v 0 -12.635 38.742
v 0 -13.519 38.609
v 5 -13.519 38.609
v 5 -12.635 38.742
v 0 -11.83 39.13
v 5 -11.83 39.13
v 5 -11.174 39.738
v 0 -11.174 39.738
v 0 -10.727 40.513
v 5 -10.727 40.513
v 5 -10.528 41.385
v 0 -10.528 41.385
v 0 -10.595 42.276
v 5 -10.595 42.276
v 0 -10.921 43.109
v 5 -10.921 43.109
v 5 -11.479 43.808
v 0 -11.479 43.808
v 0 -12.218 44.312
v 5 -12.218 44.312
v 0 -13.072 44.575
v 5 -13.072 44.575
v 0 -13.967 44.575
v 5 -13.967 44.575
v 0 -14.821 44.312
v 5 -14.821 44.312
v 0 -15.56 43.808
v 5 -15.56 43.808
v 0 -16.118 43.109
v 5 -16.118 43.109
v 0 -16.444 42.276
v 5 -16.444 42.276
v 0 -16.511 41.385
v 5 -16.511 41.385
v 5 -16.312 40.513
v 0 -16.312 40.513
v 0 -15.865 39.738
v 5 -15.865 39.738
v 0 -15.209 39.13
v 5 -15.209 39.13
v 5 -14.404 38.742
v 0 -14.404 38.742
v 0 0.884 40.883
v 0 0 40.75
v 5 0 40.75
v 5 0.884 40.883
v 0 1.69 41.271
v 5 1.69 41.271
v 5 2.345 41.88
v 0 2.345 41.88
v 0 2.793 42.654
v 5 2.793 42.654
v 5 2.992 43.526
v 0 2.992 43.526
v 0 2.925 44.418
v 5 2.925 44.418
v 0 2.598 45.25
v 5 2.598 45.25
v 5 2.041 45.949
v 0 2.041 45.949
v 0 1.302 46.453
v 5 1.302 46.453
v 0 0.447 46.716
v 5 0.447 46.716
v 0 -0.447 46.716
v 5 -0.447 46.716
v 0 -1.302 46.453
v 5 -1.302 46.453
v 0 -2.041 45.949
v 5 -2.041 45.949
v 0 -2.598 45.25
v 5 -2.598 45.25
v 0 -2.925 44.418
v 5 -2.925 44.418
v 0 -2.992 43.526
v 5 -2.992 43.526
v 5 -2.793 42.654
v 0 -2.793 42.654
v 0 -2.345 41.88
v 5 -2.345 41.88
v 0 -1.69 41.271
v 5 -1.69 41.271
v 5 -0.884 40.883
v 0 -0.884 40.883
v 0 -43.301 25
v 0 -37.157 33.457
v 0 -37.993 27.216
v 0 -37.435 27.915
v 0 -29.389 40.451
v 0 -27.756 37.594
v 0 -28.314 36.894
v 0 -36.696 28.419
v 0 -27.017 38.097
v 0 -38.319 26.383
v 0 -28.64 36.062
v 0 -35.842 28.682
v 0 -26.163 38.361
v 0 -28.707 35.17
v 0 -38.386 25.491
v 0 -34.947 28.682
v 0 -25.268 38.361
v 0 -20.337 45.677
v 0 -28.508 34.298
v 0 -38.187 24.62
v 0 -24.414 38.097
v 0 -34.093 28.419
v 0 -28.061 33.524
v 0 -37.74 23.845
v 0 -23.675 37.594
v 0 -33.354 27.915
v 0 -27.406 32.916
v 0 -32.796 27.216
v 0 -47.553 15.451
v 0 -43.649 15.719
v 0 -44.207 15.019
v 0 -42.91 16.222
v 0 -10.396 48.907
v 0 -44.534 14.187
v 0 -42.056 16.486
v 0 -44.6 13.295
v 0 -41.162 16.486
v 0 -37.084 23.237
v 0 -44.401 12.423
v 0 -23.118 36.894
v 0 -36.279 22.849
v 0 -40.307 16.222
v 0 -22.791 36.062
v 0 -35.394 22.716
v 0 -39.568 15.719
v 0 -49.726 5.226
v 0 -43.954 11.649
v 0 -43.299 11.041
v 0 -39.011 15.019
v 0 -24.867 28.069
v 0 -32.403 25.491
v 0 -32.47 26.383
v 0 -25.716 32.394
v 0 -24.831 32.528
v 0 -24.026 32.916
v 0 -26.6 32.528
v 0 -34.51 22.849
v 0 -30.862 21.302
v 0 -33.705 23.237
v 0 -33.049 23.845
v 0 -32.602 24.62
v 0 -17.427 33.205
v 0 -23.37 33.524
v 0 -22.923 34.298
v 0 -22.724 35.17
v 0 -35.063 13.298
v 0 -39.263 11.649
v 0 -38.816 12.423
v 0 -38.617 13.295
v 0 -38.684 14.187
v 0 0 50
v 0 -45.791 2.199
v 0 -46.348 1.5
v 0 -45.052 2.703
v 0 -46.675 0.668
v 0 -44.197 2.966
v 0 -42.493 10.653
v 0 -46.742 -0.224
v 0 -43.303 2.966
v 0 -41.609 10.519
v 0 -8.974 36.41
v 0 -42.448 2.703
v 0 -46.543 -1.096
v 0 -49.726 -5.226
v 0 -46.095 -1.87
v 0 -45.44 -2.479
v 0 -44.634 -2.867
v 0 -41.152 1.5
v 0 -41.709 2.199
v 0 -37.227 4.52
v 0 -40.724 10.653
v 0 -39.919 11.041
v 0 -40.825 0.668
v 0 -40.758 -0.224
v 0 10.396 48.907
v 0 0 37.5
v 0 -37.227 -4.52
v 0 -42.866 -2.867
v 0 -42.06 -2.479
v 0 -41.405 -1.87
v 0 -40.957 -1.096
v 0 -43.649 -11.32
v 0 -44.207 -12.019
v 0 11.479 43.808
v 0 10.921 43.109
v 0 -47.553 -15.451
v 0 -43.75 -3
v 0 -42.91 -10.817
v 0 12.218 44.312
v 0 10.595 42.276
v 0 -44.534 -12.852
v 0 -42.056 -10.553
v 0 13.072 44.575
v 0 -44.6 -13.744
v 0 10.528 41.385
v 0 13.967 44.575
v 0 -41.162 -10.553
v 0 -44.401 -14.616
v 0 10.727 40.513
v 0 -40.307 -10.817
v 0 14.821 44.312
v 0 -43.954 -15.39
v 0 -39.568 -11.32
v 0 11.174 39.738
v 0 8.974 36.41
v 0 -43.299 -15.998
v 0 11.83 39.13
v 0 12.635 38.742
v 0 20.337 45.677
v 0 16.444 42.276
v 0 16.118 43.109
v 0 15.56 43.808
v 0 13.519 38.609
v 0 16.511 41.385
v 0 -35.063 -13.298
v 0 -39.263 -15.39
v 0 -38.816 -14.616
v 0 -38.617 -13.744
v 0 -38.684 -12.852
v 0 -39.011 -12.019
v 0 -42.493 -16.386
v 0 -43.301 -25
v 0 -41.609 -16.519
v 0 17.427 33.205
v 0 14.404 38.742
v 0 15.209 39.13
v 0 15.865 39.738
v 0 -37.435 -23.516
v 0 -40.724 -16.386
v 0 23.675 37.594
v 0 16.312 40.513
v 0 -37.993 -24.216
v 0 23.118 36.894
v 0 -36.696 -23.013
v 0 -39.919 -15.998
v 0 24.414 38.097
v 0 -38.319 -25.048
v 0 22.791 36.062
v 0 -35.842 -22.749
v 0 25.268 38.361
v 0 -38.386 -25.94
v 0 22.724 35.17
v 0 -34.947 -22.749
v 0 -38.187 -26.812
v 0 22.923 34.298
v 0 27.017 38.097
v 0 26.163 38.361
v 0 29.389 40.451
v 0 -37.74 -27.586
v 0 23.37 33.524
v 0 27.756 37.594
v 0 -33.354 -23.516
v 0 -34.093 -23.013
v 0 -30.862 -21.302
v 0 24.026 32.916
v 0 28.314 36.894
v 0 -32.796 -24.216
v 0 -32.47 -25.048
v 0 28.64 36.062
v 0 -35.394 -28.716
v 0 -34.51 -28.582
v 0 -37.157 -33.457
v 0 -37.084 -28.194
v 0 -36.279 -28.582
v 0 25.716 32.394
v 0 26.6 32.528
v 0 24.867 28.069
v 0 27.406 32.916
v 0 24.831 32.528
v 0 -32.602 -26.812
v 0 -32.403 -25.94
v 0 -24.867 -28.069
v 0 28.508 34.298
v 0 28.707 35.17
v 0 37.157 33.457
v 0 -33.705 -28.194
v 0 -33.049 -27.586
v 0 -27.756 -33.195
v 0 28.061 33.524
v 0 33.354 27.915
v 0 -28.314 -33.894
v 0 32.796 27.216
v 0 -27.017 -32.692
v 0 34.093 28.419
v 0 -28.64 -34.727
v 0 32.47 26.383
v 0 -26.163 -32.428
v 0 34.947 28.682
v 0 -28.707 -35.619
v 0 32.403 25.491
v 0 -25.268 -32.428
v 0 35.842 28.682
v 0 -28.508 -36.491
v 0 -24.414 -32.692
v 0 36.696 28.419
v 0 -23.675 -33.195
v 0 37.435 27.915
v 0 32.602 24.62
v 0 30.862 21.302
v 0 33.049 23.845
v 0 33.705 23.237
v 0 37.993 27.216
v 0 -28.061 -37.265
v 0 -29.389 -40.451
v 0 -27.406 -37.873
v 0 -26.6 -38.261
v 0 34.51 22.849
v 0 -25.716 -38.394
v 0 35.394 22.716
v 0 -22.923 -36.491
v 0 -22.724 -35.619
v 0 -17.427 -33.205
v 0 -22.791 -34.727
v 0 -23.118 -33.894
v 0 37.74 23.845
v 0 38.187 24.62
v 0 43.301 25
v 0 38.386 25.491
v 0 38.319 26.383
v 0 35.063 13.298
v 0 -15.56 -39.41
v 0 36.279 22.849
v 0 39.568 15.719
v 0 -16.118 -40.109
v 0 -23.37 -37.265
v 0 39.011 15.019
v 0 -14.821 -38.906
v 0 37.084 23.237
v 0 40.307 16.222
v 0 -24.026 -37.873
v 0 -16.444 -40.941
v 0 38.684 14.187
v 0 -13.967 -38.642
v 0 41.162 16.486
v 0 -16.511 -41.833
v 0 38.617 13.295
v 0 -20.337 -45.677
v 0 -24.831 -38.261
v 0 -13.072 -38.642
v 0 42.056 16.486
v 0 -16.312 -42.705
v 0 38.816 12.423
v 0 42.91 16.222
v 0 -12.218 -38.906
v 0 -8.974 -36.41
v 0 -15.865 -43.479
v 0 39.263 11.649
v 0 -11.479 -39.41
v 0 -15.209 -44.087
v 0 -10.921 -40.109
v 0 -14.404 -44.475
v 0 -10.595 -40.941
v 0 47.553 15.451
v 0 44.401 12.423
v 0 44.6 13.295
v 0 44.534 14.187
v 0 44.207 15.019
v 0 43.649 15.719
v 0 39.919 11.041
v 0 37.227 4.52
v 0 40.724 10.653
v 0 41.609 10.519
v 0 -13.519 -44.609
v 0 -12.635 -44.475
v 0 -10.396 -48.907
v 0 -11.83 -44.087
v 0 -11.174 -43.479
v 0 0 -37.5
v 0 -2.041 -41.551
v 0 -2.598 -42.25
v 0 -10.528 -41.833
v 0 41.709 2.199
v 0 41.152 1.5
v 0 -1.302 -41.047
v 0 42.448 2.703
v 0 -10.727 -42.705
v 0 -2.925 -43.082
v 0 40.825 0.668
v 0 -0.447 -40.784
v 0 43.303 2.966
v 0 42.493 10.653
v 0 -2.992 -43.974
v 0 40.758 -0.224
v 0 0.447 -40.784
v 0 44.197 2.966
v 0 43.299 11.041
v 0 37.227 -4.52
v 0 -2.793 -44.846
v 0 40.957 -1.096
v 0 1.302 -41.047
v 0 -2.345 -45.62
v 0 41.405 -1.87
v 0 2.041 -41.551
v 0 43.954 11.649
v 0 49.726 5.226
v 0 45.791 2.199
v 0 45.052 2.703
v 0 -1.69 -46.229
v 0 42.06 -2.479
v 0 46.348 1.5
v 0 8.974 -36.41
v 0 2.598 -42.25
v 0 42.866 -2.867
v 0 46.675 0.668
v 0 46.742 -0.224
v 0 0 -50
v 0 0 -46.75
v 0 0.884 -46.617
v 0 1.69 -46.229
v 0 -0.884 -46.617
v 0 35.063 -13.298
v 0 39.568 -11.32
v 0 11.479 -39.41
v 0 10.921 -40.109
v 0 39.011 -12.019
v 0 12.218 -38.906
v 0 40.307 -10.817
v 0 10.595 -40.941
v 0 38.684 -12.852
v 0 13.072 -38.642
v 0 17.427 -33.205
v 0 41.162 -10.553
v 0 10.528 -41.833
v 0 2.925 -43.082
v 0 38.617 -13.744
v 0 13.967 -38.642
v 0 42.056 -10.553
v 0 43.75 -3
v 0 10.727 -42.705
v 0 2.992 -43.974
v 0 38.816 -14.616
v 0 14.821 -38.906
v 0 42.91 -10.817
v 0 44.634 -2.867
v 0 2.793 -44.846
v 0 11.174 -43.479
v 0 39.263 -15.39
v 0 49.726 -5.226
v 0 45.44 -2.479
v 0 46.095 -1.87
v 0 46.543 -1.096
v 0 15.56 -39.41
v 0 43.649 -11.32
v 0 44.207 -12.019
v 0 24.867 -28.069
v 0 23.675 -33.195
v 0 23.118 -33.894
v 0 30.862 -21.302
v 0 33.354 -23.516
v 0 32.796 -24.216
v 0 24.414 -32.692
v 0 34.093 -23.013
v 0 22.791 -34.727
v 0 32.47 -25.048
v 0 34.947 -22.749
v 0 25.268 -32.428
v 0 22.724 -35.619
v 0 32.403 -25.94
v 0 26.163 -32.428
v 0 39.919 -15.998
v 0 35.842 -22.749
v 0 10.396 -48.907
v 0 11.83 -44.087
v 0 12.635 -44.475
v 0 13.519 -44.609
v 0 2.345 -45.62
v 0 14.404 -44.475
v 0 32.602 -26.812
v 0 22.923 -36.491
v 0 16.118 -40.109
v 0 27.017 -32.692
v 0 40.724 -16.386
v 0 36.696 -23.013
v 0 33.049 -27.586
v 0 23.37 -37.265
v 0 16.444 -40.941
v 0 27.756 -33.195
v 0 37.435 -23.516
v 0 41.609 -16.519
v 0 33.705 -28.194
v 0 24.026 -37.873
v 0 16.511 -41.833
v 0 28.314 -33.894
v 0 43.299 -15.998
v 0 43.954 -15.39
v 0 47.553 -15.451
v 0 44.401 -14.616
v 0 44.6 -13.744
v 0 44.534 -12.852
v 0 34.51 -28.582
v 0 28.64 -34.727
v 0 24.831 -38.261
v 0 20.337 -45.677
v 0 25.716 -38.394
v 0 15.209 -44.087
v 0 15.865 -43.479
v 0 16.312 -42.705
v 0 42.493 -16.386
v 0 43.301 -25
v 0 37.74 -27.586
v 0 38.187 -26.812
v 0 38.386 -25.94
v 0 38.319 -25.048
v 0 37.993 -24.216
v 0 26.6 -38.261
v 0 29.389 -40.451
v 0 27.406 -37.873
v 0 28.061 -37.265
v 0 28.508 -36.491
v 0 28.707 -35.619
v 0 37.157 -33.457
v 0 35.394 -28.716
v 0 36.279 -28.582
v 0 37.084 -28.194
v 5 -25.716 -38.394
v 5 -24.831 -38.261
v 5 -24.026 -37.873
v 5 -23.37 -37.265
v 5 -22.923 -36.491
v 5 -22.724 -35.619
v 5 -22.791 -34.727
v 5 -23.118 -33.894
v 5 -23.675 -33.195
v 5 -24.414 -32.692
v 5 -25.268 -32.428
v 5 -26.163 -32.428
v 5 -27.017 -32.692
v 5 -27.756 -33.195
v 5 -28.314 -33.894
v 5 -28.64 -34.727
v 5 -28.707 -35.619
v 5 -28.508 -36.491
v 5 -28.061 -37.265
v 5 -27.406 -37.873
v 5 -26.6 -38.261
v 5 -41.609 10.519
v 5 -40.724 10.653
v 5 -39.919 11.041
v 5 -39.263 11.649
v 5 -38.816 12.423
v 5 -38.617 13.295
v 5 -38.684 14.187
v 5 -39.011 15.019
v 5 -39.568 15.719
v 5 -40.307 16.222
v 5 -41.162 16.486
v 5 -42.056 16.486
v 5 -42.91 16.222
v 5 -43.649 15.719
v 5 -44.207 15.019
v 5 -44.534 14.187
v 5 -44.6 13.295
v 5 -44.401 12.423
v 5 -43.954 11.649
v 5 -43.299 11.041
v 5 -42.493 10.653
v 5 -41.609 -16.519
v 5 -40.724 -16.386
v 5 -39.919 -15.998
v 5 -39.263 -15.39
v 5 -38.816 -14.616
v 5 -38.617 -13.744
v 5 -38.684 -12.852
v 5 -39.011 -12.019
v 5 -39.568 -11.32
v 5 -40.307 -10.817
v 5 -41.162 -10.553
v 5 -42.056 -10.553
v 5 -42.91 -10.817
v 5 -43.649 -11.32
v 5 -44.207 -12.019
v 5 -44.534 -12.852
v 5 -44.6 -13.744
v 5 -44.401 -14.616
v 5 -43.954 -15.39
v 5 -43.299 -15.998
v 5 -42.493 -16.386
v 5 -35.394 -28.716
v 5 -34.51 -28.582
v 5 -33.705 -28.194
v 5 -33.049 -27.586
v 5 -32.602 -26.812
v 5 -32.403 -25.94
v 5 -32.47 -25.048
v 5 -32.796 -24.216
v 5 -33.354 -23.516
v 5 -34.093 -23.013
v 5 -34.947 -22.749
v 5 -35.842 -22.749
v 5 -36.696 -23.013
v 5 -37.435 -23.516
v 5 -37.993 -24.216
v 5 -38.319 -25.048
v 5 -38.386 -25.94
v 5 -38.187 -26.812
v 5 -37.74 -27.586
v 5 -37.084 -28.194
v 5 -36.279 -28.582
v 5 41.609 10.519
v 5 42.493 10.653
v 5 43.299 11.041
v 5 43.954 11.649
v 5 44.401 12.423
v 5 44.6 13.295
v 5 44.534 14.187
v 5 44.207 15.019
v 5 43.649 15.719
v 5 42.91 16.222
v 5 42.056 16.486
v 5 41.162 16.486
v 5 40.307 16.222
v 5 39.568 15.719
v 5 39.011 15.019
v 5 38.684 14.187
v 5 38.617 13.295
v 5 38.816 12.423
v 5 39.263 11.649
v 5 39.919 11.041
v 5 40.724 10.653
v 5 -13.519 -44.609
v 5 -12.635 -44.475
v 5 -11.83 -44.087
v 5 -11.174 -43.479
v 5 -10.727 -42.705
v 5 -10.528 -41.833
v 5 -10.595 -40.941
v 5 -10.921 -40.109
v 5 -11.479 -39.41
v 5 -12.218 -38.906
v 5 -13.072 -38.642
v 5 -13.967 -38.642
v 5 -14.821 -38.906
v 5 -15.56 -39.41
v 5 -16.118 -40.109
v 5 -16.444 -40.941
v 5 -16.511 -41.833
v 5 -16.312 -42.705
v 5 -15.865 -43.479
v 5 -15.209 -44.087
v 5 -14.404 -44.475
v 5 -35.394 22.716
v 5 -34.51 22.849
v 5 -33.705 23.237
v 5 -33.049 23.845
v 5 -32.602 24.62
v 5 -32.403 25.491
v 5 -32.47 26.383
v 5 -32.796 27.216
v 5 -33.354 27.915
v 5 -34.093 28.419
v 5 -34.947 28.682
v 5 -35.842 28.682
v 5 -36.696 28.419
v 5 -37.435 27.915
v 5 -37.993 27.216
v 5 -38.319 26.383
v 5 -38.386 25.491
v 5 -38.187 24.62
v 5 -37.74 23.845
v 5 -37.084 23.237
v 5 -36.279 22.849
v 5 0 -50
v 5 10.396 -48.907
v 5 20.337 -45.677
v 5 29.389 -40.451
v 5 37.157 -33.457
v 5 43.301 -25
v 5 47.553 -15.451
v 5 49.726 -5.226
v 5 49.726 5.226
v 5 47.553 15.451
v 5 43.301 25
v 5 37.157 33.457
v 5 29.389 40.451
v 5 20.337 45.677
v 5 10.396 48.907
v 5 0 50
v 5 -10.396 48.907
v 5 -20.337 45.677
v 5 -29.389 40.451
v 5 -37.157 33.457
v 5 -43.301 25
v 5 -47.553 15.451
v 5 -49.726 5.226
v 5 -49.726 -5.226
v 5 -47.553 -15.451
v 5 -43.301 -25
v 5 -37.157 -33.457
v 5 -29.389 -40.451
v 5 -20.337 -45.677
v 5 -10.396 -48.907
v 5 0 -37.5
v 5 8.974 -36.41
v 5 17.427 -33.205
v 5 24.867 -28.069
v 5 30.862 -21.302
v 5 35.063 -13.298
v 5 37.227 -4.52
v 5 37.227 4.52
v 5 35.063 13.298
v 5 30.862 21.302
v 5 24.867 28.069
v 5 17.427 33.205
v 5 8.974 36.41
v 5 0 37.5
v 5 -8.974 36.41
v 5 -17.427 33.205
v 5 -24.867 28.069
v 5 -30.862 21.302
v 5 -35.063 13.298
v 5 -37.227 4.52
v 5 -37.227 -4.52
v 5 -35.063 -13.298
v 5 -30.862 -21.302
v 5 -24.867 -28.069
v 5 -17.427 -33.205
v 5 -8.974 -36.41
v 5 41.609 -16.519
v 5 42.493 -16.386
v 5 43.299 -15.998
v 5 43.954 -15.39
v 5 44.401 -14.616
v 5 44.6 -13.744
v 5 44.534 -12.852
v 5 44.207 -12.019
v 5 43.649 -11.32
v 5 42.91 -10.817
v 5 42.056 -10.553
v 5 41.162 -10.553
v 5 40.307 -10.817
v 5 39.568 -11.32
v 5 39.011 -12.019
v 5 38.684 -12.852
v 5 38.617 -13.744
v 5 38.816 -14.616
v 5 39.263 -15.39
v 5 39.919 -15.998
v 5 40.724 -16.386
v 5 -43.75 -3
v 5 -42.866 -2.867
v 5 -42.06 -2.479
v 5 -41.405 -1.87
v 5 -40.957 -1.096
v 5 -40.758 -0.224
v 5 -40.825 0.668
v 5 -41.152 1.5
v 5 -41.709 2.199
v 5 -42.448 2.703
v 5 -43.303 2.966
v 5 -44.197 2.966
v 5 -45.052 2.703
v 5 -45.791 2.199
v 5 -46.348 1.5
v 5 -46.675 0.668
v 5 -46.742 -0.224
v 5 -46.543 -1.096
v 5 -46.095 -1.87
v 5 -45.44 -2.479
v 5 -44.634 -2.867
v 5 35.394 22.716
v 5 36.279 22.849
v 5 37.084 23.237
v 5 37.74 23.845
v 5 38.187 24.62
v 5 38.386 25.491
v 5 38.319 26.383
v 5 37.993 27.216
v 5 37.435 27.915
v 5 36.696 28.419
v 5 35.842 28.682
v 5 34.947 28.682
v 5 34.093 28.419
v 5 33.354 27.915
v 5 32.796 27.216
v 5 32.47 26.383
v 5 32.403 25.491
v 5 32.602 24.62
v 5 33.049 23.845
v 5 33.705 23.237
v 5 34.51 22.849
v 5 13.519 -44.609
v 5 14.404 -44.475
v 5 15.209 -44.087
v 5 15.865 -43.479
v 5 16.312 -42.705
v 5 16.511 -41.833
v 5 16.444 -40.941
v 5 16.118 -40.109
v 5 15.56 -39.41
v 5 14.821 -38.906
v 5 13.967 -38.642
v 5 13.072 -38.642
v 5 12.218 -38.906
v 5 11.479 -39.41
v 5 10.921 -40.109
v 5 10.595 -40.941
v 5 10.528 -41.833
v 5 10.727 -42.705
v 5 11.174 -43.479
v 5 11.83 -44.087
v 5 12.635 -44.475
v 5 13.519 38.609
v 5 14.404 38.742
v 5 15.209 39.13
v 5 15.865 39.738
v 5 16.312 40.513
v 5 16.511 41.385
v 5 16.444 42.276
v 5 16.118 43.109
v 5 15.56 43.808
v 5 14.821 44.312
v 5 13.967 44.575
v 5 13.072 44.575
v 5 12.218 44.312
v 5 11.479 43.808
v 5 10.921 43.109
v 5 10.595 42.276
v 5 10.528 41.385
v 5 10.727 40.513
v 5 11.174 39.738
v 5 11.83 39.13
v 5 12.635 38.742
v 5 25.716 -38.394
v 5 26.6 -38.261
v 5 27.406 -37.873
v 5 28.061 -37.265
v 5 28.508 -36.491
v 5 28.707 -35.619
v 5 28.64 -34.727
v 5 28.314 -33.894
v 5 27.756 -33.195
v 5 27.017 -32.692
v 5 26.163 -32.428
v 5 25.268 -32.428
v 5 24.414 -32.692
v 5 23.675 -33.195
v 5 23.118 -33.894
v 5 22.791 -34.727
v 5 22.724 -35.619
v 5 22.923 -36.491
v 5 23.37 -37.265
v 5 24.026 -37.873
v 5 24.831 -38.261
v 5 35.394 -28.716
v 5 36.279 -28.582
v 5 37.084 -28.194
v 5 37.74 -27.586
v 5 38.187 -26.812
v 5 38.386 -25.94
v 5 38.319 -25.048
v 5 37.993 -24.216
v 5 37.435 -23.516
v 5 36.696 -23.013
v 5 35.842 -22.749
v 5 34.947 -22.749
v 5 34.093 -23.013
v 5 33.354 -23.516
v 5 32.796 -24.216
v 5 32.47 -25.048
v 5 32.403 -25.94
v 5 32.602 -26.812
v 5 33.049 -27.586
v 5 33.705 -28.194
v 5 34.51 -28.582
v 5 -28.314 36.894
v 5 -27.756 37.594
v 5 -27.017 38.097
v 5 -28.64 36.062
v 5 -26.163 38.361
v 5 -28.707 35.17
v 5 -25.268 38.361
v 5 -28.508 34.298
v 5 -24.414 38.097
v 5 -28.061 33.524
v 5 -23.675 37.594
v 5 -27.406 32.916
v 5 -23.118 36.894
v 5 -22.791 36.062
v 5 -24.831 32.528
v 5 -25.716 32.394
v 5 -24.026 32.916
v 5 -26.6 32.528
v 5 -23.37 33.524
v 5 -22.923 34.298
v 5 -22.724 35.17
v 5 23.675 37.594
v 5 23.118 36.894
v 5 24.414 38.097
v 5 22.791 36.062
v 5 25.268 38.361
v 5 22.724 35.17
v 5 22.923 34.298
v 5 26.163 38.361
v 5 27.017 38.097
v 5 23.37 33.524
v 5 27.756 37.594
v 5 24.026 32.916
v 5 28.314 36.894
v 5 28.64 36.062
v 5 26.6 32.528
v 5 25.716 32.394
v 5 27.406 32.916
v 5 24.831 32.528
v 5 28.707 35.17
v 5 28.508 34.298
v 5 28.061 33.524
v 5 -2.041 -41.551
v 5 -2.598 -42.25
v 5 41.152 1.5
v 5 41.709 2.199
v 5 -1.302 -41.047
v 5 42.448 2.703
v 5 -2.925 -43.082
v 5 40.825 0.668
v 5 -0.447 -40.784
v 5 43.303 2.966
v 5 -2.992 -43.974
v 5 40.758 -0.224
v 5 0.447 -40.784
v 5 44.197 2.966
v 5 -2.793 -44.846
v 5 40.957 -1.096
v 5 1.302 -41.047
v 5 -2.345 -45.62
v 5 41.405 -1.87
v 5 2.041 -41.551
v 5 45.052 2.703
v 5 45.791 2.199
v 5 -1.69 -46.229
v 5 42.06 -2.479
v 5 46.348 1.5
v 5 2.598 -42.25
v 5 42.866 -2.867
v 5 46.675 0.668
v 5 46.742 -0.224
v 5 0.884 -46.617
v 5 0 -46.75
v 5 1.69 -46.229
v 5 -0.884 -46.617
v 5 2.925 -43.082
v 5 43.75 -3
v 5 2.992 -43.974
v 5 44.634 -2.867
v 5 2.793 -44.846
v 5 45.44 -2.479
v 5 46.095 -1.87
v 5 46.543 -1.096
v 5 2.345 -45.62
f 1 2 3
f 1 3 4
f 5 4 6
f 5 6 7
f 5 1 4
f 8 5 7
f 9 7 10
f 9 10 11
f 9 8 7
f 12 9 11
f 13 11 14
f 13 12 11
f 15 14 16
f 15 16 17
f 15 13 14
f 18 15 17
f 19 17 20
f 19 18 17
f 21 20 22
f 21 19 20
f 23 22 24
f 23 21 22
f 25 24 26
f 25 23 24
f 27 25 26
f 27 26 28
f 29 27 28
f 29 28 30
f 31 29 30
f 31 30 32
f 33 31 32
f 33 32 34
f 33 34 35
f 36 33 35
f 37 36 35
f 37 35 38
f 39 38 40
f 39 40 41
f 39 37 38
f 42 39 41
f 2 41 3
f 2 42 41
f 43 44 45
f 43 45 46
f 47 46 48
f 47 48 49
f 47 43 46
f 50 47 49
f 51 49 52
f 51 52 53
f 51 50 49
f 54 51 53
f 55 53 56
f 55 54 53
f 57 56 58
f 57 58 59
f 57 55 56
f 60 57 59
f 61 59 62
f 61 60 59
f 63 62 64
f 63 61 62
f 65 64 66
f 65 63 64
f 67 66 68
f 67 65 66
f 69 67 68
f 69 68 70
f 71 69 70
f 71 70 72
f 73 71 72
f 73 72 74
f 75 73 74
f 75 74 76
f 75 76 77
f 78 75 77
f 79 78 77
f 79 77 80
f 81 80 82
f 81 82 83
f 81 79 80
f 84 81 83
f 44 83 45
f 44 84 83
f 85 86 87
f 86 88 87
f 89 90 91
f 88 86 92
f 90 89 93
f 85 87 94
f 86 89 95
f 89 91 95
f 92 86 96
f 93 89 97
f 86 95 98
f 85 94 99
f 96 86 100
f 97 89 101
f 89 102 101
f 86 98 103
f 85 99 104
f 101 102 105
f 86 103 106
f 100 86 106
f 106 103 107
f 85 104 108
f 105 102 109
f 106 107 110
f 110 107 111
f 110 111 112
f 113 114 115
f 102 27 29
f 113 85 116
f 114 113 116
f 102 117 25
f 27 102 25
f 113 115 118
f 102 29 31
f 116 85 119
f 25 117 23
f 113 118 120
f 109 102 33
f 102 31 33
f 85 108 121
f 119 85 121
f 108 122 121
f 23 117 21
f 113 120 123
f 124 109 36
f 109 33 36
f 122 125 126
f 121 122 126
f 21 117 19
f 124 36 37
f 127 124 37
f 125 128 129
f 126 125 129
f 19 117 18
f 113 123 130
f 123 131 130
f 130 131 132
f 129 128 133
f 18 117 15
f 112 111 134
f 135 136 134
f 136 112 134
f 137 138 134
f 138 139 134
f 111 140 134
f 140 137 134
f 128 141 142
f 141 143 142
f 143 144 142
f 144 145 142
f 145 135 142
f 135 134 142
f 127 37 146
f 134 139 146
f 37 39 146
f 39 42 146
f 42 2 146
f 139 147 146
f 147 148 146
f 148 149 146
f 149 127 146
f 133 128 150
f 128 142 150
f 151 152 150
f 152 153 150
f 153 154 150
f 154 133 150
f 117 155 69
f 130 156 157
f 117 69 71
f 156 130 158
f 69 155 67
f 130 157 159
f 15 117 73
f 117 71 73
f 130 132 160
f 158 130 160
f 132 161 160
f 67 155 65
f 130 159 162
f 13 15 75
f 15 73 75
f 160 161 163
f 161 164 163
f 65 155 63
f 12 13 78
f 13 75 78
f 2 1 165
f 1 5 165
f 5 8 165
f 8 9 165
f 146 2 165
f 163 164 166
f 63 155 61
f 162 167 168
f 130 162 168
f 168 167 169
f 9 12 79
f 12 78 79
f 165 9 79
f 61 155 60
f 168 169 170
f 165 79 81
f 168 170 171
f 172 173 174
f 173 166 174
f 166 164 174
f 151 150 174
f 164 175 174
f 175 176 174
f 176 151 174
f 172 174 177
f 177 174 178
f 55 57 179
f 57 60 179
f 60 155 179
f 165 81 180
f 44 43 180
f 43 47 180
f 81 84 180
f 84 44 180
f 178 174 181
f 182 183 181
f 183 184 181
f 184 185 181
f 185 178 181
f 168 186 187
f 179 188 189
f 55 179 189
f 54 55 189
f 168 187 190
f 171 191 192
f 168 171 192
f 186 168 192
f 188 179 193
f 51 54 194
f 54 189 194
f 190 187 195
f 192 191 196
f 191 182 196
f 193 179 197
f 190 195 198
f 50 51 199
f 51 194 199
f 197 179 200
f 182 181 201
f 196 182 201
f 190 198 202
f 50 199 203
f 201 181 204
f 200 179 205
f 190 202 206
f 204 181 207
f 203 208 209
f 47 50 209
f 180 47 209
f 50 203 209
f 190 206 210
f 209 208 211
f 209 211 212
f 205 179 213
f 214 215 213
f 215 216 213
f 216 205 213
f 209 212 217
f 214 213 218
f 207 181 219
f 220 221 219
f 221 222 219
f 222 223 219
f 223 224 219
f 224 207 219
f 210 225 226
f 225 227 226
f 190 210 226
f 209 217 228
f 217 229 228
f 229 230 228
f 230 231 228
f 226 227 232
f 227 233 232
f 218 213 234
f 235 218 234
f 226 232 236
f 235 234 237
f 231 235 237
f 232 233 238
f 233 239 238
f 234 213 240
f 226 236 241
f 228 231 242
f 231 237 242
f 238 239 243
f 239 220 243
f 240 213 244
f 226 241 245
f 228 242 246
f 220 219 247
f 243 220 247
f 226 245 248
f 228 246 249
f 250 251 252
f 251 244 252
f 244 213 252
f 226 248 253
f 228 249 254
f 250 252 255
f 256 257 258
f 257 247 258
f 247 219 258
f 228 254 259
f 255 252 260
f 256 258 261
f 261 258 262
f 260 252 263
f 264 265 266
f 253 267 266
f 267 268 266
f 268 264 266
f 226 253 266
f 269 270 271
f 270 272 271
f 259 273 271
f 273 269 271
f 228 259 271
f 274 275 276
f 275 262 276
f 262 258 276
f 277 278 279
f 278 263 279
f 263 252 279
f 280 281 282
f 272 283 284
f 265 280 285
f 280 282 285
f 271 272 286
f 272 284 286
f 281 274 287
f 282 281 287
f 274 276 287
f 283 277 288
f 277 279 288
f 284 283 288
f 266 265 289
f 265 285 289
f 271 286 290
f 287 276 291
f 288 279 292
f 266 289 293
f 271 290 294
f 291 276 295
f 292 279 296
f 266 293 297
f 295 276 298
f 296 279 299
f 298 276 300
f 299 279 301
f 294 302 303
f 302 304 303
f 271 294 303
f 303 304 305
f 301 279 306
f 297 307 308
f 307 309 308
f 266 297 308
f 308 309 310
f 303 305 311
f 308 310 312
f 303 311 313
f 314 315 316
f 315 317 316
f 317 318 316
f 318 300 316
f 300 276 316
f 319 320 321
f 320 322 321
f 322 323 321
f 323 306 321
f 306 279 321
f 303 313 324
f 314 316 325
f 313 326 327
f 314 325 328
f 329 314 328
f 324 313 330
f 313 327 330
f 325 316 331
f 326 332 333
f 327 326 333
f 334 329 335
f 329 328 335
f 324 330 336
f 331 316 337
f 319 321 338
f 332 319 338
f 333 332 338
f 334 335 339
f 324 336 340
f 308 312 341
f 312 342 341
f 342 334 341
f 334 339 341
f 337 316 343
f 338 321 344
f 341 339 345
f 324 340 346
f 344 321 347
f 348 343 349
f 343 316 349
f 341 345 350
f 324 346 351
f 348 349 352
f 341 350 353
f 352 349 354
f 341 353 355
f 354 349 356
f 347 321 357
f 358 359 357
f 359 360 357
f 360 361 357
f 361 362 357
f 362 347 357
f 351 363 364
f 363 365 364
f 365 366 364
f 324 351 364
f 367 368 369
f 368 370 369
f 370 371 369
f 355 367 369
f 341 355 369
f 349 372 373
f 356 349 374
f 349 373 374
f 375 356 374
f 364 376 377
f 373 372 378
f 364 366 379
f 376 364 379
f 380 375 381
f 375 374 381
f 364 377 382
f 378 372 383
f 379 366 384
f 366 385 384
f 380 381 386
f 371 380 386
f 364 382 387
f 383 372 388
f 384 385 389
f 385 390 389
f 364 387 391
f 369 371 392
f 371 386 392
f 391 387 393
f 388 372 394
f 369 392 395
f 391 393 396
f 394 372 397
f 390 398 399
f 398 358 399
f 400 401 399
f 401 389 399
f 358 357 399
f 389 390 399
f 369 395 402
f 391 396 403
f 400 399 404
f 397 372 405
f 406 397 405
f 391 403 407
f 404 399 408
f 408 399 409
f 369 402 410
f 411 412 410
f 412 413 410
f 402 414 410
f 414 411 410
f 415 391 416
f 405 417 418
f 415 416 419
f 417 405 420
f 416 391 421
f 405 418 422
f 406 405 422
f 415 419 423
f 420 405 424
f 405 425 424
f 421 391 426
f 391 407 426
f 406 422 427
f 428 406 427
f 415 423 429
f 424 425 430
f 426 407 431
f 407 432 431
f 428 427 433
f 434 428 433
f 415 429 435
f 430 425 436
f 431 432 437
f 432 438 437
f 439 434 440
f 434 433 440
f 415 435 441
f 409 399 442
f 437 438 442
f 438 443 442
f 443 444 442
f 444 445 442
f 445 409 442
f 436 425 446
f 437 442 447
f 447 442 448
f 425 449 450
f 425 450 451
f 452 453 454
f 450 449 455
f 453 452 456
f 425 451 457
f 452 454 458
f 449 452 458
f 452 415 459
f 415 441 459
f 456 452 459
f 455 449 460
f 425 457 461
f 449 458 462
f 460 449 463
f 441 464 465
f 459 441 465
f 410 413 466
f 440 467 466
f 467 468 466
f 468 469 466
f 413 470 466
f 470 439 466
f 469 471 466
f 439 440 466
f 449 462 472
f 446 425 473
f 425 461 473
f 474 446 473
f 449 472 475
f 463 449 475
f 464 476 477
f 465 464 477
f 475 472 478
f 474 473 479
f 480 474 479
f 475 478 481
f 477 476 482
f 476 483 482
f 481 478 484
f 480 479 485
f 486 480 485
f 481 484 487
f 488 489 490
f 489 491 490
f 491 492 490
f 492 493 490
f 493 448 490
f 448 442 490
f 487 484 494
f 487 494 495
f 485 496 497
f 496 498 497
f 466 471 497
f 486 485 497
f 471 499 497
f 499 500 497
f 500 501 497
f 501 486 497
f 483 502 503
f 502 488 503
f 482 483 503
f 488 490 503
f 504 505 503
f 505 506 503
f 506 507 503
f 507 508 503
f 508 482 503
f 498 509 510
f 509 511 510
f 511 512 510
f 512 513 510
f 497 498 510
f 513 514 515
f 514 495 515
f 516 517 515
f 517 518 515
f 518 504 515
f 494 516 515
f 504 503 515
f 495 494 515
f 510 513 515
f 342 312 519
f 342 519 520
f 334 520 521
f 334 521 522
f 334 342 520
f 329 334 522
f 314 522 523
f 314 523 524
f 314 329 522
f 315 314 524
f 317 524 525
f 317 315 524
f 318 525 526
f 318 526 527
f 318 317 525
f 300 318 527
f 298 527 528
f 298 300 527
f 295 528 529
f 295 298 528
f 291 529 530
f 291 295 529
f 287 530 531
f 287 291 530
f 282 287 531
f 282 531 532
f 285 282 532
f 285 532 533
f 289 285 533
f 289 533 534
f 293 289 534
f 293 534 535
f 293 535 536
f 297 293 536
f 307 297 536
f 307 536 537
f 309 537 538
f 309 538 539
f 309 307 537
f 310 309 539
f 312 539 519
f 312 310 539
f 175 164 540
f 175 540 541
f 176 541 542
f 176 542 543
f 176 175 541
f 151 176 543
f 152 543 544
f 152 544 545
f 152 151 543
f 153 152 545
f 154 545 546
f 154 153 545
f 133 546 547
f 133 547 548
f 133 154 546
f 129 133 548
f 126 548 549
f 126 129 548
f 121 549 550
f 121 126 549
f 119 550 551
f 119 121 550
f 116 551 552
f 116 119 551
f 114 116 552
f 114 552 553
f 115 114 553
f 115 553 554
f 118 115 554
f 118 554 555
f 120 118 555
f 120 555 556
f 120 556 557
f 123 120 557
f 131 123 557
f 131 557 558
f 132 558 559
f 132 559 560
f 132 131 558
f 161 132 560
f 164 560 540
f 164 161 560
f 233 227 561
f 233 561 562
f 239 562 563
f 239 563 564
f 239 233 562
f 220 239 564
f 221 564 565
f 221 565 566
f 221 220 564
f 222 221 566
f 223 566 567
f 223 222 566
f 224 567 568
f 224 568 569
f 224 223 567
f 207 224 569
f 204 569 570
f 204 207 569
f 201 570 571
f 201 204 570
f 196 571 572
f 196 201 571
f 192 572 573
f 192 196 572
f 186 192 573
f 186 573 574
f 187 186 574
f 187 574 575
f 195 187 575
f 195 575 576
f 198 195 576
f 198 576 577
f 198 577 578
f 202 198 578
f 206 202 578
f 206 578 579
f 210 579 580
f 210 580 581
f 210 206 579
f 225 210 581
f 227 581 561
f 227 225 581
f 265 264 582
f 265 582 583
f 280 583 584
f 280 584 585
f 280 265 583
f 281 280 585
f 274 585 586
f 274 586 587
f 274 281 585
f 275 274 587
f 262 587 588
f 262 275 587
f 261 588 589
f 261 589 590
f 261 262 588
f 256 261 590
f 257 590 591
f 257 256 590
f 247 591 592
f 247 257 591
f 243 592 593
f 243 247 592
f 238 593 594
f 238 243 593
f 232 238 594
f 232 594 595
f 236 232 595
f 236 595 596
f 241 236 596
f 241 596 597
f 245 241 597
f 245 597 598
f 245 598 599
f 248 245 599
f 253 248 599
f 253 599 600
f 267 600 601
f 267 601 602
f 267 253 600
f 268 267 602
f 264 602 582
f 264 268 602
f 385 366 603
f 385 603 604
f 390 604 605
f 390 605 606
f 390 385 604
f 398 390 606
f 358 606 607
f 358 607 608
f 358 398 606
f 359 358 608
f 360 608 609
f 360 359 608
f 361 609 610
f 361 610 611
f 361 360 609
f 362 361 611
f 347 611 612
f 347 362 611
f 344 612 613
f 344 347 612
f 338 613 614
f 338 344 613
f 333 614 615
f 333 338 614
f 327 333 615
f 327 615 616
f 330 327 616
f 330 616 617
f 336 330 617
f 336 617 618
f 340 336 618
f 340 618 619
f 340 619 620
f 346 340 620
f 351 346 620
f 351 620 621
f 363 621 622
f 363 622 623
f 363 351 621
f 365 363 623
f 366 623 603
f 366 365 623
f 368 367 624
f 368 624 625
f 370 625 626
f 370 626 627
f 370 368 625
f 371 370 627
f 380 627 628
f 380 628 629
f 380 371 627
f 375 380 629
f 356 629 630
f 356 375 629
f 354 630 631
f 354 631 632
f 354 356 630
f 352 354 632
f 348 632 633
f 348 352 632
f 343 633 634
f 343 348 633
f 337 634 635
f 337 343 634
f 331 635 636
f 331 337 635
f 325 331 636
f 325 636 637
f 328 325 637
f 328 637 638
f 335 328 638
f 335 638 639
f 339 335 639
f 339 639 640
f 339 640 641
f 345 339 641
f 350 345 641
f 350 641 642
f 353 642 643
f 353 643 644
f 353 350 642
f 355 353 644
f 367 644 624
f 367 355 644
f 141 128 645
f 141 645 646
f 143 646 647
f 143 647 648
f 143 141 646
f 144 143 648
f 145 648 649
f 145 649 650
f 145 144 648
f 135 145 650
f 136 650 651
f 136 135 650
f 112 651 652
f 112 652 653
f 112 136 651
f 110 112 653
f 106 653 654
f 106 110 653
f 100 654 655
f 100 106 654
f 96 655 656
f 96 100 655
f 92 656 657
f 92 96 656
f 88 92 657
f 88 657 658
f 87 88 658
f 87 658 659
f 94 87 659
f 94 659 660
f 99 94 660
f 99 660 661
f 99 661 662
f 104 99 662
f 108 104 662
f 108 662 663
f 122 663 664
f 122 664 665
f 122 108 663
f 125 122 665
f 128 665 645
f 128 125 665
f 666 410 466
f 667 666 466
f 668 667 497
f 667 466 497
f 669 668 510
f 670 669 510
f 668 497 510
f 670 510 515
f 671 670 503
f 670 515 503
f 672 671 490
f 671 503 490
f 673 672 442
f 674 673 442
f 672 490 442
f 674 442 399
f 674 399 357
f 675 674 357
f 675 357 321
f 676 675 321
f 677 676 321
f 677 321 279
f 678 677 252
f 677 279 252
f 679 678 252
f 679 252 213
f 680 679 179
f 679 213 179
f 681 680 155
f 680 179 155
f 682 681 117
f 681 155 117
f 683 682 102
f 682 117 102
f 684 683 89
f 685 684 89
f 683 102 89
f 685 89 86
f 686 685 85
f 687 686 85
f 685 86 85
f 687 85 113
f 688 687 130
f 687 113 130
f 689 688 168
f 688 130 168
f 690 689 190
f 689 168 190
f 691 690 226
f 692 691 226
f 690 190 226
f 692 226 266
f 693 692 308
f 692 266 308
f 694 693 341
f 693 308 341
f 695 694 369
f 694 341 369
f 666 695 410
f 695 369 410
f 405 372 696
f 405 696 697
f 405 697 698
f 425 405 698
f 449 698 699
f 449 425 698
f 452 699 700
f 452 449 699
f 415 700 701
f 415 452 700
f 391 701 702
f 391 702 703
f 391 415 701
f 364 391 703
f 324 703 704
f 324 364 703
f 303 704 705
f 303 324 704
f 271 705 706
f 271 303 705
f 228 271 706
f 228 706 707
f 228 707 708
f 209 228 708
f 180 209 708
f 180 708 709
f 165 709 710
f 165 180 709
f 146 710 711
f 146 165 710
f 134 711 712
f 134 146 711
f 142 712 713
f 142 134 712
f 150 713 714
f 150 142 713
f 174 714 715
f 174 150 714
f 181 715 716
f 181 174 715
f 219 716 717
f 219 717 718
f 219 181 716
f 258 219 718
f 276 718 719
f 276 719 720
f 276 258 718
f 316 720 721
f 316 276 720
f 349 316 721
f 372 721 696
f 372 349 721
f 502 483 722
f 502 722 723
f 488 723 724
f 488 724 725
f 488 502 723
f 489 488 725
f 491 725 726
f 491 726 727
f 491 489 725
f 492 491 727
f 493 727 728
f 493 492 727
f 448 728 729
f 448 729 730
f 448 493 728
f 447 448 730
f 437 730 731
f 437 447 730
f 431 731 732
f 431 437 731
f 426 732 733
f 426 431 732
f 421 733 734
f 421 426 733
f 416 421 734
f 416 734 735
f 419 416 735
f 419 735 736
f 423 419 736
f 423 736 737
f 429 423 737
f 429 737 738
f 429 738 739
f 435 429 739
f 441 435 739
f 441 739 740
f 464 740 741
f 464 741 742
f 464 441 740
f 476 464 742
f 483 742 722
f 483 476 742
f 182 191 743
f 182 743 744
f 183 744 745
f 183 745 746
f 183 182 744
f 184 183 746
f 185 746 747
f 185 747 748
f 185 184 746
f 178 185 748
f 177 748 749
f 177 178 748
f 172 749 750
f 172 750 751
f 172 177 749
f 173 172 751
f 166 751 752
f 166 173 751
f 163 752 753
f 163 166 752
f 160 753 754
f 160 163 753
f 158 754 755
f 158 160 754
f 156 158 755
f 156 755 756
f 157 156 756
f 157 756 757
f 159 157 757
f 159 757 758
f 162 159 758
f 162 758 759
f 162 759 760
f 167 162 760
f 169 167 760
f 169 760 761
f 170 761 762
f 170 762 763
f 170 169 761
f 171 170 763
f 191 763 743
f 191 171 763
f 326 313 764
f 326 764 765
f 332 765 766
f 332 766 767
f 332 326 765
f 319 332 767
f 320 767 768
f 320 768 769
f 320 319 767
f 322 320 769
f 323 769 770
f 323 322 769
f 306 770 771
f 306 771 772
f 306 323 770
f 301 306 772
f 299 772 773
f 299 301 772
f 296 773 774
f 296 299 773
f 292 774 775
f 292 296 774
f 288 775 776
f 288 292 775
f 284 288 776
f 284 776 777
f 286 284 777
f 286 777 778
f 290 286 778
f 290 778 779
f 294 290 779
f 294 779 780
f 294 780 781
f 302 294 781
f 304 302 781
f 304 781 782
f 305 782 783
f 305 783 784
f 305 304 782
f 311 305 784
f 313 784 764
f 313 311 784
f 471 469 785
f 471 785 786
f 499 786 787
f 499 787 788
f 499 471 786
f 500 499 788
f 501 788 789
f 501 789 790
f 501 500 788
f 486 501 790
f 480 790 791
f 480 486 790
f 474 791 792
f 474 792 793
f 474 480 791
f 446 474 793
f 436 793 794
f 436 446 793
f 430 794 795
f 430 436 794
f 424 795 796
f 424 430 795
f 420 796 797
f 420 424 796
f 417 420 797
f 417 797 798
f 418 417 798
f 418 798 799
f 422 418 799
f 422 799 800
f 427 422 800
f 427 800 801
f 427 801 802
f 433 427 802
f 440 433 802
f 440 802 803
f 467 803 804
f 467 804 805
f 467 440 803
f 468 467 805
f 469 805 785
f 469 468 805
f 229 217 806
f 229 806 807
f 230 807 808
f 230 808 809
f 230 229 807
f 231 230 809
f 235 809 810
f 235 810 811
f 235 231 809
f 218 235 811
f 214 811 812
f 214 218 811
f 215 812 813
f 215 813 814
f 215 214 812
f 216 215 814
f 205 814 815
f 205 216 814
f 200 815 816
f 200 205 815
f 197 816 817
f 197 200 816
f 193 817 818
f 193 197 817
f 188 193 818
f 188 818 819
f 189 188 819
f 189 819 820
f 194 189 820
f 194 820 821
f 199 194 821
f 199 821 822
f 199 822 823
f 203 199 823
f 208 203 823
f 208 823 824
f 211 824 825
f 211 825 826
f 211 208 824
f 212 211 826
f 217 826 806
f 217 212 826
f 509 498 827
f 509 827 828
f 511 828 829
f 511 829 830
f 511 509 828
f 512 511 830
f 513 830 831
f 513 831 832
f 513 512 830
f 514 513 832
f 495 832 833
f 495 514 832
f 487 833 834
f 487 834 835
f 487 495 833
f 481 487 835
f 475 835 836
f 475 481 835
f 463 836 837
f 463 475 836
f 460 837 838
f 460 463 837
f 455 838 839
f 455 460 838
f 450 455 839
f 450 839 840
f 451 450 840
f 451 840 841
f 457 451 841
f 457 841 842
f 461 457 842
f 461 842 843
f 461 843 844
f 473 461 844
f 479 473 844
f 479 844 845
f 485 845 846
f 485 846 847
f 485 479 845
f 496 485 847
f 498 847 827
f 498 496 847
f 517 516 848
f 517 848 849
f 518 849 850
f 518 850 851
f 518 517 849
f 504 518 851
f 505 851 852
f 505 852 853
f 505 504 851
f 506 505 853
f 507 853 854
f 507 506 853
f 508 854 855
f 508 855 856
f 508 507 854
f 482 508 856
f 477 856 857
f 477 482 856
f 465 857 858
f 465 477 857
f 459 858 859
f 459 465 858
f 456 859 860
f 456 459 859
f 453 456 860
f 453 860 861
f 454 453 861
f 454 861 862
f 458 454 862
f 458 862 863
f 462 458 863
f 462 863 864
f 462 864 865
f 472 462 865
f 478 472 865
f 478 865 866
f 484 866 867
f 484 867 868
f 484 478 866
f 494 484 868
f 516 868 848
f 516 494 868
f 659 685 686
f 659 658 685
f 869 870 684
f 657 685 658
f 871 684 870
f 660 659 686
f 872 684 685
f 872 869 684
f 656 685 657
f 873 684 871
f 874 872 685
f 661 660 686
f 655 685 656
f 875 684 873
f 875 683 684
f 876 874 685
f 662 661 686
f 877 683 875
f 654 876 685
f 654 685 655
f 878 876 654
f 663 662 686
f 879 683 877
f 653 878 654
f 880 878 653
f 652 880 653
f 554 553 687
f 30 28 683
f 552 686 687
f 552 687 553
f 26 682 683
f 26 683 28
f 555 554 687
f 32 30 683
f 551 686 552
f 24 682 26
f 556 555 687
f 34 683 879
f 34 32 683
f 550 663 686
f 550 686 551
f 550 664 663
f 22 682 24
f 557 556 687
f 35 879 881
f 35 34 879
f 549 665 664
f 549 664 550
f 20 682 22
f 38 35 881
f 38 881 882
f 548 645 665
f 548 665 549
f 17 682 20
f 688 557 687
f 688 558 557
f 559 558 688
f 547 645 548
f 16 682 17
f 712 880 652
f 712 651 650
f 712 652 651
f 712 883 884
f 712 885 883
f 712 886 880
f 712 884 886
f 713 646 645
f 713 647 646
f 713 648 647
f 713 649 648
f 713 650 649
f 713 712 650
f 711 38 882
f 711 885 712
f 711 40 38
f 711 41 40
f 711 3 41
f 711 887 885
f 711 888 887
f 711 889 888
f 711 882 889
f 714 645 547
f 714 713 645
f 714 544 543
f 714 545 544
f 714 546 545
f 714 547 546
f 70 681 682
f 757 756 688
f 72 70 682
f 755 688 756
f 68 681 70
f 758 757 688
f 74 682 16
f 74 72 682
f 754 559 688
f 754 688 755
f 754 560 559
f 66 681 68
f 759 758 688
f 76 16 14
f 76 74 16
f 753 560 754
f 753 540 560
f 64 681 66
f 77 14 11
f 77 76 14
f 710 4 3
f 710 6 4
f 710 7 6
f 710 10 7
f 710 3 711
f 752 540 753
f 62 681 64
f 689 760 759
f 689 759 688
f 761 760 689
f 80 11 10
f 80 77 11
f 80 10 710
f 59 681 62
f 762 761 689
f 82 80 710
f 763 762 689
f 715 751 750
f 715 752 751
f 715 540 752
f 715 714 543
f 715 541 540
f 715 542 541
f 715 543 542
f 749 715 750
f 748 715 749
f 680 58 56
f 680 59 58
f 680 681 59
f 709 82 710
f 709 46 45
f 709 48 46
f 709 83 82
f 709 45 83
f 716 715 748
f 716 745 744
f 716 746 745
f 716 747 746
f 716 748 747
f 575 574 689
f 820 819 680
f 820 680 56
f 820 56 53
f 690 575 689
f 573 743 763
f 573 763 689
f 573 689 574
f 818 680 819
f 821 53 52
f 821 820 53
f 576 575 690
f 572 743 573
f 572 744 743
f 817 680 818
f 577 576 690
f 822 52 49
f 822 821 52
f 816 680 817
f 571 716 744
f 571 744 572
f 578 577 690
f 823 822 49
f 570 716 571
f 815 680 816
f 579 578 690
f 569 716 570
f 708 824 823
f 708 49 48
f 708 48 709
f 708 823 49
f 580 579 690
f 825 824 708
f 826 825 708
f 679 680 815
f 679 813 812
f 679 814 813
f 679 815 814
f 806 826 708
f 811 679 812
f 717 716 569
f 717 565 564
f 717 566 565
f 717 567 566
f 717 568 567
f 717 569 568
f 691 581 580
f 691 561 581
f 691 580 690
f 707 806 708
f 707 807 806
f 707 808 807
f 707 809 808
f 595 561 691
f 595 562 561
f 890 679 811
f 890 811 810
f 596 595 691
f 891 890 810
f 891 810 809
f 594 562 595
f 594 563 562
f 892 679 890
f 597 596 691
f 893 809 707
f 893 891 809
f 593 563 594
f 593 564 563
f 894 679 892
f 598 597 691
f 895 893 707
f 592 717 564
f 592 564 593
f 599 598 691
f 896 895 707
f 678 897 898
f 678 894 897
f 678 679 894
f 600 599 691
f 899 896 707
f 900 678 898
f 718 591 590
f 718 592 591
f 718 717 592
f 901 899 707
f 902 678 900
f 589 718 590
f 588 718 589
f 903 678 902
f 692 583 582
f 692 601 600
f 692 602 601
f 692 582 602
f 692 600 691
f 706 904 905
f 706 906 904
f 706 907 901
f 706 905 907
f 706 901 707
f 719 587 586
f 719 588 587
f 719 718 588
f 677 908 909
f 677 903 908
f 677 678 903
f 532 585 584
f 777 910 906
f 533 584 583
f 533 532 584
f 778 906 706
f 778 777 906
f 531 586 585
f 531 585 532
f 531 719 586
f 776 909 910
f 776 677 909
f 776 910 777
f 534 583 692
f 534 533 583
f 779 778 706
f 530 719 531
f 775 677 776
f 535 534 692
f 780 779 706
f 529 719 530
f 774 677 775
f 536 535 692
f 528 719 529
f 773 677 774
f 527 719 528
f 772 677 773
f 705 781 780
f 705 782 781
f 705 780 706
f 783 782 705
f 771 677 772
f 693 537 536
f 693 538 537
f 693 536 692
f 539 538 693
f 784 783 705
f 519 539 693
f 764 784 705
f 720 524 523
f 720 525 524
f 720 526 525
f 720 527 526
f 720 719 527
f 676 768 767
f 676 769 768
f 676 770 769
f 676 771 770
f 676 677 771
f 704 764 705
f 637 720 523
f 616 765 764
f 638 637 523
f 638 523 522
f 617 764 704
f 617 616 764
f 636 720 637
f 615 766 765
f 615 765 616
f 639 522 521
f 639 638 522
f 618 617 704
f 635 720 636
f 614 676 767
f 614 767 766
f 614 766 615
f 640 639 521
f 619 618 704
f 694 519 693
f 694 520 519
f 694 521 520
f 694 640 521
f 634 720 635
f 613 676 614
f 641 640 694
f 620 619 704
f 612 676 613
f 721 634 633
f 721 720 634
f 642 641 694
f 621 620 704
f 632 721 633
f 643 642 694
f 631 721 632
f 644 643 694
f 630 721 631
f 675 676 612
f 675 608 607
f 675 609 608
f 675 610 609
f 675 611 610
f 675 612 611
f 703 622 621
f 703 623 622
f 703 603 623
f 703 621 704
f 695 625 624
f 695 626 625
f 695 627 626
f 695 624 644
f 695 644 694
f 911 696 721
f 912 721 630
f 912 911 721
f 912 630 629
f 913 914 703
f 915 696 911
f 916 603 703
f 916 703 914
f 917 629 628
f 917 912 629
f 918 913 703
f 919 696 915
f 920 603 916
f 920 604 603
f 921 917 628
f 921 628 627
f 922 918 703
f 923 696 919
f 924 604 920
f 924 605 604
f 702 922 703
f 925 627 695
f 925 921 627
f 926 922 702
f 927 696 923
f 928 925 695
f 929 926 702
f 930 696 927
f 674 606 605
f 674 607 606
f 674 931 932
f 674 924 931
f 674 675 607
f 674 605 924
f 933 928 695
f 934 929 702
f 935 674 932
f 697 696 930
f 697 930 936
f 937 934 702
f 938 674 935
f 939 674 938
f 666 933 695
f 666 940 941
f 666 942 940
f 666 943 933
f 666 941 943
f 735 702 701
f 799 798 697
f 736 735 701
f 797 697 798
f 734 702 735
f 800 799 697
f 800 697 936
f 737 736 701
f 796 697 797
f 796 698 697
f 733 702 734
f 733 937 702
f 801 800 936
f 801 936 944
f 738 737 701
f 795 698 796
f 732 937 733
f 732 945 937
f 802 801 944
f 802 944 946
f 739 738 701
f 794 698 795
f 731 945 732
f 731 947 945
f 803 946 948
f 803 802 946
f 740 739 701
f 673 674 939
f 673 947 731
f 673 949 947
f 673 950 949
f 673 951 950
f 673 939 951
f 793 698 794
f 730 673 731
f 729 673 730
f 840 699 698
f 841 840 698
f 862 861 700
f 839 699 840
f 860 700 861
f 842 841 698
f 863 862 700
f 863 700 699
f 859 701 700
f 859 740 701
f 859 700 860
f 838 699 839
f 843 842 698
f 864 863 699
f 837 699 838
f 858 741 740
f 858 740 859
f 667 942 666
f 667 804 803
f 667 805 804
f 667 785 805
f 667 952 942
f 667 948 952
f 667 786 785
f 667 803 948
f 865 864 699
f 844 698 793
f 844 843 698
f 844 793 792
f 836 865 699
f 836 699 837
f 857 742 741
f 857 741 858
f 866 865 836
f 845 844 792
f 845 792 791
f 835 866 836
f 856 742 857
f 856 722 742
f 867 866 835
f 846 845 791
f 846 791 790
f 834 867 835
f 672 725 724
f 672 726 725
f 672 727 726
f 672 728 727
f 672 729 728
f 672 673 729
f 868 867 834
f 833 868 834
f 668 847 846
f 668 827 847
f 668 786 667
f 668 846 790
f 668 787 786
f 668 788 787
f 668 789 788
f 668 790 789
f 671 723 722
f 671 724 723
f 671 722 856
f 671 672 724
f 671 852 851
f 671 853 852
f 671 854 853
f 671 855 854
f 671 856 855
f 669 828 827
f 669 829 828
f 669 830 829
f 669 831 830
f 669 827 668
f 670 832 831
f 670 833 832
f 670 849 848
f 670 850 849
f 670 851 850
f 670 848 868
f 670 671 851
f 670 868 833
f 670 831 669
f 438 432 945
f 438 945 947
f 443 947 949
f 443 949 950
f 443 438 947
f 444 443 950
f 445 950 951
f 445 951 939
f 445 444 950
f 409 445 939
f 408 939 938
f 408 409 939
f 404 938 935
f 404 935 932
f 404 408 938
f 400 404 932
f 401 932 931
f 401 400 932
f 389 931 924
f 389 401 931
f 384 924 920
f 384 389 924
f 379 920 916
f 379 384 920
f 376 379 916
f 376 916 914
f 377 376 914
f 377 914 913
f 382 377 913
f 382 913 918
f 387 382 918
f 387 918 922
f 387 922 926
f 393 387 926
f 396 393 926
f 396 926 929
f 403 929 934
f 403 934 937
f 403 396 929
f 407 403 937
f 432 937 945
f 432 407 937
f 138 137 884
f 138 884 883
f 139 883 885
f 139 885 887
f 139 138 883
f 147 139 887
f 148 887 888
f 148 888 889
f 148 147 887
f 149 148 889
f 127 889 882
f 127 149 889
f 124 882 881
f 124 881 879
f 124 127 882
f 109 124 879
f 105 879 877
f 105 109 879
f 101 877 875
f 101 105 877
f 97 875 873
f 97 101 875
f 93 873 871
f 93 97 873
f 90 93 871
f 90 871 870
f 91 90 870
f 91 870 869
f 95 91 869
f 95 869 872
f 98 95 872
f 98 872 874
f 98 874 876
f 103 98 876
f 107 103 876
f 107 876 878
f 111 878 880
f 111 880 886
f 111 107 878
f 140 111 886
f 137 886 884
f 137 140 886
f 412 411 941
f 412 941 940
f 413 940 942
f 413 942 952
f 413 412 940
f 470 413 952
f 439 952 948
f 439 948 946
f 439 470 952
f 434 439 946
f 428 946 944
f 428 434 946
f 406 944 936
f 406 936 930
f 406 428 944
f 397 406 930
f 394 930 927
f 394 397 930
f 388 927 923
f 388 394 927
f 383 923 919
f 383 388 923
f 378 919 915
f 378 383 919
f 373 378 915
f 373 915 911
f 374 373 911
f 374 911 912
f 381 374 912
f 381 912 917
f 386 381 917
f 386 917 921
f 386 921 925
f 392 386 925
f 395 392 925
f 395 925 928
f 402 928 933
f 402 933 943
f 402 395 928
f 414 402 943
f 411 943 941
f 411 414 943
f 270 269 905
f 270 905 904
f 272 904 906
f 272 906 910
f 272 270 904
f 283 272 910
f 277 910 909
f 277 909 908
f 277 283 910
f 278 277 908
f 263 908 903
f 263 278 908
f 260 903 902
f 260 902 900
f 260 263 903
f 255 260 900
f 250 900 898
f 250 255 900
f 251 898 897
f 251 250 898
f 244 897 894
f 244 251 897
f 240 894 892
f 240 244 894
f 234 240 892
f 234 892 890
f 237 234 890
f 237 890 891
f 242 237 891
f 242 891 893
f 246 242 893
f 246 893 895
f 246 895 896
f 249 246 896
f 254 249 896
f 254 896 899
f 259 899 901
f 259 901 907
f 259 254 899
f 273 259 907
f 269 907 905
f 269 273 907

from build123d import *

# Parameters (mm, degrees)
SKETCH_1_R      = 50
SKETCH_1_R_2    = 37.5
SKETCH_1_R_3    = 3
EXTRUDE_1_DEPTH = 5


with BuildPart() as part:
    # Эскиз1 → Бобышка-Вытянуть1 (new body)
    with BuildSketch(Plane(origin=(0, 0, 0), x_dir=(0, 0, -1), z_dir=(1, 0, 0))):
        Circle(SKETCH_1_R)
        Circle(SKETCH_1_R_2, mode=Mode.SUBTRACT)
        with Locations((0, 43.75)):
            Circle(SKETCH_1_R_3, mode=Mode.SUBTRACT)
        with Locations((13.519493504, 41.608722588)):
            Circle(SKETCH_1_R_3, mode=Mode.SUBTRACT)
        with Locations((25.715604788, 35.394493504)):
            Circle(SKETCH_1_R_3, mode=Mode.SUBTRACT)
        with Locations((35.394493504, 25.715604788)):
            Circle(SKETCH_1_R_3, mode=Mode.SUBTRACT)
        with Locations((41.608722588, 13.519493504)):
            Circle(SKETCH_1_R_3, mode=Mode.SUBTRACT)
        with Locations((43.75, 0)):
            Circle(SKETCH_1_R_3, mode=Mode.SUBTRACT)
        with Locations((41.608722588, -13.519493504)):
            Circle(SKETCH_1_R_3, mode=Mode.SUBTRACT)
        with Locations((35.394493504, -25.715604788)):
            Circle(SKETCH_1_R_3, mode=Mode.SUBTRACT)
        with Locations((25.715604788, -35.394493504)):
            Circle(SKETCH_1_R_3, mode=Mode.SUBTRACT)
        with Locations((13.519493504, -41.608722588)):
            Circle(SKETCH_1_R_3, mode=Mode.SUBTRACT)
        with Locations((0, -43.75)):
            Circle(SKETCH_1_R_3, mode=Mode.SUBTRACT)
        with Locations((-13.519493504, -41.608722588)):
            Circle(SKETCH_1_R_3, mode=Mode.SUBTRACT)
        with Locations((-25.715604788, -35.394493504)):
            Circle(SKETCH_1_R_3, mode=Mode.SUBTRACT)
        with Locations((-35.394493504, -25.715604788)):
            Circle(SKETCH_1_R_3, mode=Mode.SUBTRACT)
        with Locations((-41.608722588, -13.519493504)):
            Circle(SKETCH_1_R_3, mode=Mode.SUBTRACT)
        with Locations((-43.75, 0)):
            Circle(SKETCH_1_R_3, mode=Mode.SUBTRACT)
        with Locations((-41.608722588, 13.519493504)):
            Circle(SKETCH_1_R_3, mode=Mode.SUBTRACT)
        with Locations((-35.394493504, 25.715604788)):
            Circle(SKETCH_1_R_3, mode=Mode.SUBTRACT)
        with Locations((-25.715604788, 35.394493504)):
            Circle(SKETCH_1_R_3, mode=Mode.SUBTRACT)
        with Locations((-13.519493504, 41.608722588)):
            Circle(SKETCH_1_R_3, mode=Mode.SUBTRACT)
    extrude(amount=EXTRUDE_1_DEPTH)


solid = part.part
